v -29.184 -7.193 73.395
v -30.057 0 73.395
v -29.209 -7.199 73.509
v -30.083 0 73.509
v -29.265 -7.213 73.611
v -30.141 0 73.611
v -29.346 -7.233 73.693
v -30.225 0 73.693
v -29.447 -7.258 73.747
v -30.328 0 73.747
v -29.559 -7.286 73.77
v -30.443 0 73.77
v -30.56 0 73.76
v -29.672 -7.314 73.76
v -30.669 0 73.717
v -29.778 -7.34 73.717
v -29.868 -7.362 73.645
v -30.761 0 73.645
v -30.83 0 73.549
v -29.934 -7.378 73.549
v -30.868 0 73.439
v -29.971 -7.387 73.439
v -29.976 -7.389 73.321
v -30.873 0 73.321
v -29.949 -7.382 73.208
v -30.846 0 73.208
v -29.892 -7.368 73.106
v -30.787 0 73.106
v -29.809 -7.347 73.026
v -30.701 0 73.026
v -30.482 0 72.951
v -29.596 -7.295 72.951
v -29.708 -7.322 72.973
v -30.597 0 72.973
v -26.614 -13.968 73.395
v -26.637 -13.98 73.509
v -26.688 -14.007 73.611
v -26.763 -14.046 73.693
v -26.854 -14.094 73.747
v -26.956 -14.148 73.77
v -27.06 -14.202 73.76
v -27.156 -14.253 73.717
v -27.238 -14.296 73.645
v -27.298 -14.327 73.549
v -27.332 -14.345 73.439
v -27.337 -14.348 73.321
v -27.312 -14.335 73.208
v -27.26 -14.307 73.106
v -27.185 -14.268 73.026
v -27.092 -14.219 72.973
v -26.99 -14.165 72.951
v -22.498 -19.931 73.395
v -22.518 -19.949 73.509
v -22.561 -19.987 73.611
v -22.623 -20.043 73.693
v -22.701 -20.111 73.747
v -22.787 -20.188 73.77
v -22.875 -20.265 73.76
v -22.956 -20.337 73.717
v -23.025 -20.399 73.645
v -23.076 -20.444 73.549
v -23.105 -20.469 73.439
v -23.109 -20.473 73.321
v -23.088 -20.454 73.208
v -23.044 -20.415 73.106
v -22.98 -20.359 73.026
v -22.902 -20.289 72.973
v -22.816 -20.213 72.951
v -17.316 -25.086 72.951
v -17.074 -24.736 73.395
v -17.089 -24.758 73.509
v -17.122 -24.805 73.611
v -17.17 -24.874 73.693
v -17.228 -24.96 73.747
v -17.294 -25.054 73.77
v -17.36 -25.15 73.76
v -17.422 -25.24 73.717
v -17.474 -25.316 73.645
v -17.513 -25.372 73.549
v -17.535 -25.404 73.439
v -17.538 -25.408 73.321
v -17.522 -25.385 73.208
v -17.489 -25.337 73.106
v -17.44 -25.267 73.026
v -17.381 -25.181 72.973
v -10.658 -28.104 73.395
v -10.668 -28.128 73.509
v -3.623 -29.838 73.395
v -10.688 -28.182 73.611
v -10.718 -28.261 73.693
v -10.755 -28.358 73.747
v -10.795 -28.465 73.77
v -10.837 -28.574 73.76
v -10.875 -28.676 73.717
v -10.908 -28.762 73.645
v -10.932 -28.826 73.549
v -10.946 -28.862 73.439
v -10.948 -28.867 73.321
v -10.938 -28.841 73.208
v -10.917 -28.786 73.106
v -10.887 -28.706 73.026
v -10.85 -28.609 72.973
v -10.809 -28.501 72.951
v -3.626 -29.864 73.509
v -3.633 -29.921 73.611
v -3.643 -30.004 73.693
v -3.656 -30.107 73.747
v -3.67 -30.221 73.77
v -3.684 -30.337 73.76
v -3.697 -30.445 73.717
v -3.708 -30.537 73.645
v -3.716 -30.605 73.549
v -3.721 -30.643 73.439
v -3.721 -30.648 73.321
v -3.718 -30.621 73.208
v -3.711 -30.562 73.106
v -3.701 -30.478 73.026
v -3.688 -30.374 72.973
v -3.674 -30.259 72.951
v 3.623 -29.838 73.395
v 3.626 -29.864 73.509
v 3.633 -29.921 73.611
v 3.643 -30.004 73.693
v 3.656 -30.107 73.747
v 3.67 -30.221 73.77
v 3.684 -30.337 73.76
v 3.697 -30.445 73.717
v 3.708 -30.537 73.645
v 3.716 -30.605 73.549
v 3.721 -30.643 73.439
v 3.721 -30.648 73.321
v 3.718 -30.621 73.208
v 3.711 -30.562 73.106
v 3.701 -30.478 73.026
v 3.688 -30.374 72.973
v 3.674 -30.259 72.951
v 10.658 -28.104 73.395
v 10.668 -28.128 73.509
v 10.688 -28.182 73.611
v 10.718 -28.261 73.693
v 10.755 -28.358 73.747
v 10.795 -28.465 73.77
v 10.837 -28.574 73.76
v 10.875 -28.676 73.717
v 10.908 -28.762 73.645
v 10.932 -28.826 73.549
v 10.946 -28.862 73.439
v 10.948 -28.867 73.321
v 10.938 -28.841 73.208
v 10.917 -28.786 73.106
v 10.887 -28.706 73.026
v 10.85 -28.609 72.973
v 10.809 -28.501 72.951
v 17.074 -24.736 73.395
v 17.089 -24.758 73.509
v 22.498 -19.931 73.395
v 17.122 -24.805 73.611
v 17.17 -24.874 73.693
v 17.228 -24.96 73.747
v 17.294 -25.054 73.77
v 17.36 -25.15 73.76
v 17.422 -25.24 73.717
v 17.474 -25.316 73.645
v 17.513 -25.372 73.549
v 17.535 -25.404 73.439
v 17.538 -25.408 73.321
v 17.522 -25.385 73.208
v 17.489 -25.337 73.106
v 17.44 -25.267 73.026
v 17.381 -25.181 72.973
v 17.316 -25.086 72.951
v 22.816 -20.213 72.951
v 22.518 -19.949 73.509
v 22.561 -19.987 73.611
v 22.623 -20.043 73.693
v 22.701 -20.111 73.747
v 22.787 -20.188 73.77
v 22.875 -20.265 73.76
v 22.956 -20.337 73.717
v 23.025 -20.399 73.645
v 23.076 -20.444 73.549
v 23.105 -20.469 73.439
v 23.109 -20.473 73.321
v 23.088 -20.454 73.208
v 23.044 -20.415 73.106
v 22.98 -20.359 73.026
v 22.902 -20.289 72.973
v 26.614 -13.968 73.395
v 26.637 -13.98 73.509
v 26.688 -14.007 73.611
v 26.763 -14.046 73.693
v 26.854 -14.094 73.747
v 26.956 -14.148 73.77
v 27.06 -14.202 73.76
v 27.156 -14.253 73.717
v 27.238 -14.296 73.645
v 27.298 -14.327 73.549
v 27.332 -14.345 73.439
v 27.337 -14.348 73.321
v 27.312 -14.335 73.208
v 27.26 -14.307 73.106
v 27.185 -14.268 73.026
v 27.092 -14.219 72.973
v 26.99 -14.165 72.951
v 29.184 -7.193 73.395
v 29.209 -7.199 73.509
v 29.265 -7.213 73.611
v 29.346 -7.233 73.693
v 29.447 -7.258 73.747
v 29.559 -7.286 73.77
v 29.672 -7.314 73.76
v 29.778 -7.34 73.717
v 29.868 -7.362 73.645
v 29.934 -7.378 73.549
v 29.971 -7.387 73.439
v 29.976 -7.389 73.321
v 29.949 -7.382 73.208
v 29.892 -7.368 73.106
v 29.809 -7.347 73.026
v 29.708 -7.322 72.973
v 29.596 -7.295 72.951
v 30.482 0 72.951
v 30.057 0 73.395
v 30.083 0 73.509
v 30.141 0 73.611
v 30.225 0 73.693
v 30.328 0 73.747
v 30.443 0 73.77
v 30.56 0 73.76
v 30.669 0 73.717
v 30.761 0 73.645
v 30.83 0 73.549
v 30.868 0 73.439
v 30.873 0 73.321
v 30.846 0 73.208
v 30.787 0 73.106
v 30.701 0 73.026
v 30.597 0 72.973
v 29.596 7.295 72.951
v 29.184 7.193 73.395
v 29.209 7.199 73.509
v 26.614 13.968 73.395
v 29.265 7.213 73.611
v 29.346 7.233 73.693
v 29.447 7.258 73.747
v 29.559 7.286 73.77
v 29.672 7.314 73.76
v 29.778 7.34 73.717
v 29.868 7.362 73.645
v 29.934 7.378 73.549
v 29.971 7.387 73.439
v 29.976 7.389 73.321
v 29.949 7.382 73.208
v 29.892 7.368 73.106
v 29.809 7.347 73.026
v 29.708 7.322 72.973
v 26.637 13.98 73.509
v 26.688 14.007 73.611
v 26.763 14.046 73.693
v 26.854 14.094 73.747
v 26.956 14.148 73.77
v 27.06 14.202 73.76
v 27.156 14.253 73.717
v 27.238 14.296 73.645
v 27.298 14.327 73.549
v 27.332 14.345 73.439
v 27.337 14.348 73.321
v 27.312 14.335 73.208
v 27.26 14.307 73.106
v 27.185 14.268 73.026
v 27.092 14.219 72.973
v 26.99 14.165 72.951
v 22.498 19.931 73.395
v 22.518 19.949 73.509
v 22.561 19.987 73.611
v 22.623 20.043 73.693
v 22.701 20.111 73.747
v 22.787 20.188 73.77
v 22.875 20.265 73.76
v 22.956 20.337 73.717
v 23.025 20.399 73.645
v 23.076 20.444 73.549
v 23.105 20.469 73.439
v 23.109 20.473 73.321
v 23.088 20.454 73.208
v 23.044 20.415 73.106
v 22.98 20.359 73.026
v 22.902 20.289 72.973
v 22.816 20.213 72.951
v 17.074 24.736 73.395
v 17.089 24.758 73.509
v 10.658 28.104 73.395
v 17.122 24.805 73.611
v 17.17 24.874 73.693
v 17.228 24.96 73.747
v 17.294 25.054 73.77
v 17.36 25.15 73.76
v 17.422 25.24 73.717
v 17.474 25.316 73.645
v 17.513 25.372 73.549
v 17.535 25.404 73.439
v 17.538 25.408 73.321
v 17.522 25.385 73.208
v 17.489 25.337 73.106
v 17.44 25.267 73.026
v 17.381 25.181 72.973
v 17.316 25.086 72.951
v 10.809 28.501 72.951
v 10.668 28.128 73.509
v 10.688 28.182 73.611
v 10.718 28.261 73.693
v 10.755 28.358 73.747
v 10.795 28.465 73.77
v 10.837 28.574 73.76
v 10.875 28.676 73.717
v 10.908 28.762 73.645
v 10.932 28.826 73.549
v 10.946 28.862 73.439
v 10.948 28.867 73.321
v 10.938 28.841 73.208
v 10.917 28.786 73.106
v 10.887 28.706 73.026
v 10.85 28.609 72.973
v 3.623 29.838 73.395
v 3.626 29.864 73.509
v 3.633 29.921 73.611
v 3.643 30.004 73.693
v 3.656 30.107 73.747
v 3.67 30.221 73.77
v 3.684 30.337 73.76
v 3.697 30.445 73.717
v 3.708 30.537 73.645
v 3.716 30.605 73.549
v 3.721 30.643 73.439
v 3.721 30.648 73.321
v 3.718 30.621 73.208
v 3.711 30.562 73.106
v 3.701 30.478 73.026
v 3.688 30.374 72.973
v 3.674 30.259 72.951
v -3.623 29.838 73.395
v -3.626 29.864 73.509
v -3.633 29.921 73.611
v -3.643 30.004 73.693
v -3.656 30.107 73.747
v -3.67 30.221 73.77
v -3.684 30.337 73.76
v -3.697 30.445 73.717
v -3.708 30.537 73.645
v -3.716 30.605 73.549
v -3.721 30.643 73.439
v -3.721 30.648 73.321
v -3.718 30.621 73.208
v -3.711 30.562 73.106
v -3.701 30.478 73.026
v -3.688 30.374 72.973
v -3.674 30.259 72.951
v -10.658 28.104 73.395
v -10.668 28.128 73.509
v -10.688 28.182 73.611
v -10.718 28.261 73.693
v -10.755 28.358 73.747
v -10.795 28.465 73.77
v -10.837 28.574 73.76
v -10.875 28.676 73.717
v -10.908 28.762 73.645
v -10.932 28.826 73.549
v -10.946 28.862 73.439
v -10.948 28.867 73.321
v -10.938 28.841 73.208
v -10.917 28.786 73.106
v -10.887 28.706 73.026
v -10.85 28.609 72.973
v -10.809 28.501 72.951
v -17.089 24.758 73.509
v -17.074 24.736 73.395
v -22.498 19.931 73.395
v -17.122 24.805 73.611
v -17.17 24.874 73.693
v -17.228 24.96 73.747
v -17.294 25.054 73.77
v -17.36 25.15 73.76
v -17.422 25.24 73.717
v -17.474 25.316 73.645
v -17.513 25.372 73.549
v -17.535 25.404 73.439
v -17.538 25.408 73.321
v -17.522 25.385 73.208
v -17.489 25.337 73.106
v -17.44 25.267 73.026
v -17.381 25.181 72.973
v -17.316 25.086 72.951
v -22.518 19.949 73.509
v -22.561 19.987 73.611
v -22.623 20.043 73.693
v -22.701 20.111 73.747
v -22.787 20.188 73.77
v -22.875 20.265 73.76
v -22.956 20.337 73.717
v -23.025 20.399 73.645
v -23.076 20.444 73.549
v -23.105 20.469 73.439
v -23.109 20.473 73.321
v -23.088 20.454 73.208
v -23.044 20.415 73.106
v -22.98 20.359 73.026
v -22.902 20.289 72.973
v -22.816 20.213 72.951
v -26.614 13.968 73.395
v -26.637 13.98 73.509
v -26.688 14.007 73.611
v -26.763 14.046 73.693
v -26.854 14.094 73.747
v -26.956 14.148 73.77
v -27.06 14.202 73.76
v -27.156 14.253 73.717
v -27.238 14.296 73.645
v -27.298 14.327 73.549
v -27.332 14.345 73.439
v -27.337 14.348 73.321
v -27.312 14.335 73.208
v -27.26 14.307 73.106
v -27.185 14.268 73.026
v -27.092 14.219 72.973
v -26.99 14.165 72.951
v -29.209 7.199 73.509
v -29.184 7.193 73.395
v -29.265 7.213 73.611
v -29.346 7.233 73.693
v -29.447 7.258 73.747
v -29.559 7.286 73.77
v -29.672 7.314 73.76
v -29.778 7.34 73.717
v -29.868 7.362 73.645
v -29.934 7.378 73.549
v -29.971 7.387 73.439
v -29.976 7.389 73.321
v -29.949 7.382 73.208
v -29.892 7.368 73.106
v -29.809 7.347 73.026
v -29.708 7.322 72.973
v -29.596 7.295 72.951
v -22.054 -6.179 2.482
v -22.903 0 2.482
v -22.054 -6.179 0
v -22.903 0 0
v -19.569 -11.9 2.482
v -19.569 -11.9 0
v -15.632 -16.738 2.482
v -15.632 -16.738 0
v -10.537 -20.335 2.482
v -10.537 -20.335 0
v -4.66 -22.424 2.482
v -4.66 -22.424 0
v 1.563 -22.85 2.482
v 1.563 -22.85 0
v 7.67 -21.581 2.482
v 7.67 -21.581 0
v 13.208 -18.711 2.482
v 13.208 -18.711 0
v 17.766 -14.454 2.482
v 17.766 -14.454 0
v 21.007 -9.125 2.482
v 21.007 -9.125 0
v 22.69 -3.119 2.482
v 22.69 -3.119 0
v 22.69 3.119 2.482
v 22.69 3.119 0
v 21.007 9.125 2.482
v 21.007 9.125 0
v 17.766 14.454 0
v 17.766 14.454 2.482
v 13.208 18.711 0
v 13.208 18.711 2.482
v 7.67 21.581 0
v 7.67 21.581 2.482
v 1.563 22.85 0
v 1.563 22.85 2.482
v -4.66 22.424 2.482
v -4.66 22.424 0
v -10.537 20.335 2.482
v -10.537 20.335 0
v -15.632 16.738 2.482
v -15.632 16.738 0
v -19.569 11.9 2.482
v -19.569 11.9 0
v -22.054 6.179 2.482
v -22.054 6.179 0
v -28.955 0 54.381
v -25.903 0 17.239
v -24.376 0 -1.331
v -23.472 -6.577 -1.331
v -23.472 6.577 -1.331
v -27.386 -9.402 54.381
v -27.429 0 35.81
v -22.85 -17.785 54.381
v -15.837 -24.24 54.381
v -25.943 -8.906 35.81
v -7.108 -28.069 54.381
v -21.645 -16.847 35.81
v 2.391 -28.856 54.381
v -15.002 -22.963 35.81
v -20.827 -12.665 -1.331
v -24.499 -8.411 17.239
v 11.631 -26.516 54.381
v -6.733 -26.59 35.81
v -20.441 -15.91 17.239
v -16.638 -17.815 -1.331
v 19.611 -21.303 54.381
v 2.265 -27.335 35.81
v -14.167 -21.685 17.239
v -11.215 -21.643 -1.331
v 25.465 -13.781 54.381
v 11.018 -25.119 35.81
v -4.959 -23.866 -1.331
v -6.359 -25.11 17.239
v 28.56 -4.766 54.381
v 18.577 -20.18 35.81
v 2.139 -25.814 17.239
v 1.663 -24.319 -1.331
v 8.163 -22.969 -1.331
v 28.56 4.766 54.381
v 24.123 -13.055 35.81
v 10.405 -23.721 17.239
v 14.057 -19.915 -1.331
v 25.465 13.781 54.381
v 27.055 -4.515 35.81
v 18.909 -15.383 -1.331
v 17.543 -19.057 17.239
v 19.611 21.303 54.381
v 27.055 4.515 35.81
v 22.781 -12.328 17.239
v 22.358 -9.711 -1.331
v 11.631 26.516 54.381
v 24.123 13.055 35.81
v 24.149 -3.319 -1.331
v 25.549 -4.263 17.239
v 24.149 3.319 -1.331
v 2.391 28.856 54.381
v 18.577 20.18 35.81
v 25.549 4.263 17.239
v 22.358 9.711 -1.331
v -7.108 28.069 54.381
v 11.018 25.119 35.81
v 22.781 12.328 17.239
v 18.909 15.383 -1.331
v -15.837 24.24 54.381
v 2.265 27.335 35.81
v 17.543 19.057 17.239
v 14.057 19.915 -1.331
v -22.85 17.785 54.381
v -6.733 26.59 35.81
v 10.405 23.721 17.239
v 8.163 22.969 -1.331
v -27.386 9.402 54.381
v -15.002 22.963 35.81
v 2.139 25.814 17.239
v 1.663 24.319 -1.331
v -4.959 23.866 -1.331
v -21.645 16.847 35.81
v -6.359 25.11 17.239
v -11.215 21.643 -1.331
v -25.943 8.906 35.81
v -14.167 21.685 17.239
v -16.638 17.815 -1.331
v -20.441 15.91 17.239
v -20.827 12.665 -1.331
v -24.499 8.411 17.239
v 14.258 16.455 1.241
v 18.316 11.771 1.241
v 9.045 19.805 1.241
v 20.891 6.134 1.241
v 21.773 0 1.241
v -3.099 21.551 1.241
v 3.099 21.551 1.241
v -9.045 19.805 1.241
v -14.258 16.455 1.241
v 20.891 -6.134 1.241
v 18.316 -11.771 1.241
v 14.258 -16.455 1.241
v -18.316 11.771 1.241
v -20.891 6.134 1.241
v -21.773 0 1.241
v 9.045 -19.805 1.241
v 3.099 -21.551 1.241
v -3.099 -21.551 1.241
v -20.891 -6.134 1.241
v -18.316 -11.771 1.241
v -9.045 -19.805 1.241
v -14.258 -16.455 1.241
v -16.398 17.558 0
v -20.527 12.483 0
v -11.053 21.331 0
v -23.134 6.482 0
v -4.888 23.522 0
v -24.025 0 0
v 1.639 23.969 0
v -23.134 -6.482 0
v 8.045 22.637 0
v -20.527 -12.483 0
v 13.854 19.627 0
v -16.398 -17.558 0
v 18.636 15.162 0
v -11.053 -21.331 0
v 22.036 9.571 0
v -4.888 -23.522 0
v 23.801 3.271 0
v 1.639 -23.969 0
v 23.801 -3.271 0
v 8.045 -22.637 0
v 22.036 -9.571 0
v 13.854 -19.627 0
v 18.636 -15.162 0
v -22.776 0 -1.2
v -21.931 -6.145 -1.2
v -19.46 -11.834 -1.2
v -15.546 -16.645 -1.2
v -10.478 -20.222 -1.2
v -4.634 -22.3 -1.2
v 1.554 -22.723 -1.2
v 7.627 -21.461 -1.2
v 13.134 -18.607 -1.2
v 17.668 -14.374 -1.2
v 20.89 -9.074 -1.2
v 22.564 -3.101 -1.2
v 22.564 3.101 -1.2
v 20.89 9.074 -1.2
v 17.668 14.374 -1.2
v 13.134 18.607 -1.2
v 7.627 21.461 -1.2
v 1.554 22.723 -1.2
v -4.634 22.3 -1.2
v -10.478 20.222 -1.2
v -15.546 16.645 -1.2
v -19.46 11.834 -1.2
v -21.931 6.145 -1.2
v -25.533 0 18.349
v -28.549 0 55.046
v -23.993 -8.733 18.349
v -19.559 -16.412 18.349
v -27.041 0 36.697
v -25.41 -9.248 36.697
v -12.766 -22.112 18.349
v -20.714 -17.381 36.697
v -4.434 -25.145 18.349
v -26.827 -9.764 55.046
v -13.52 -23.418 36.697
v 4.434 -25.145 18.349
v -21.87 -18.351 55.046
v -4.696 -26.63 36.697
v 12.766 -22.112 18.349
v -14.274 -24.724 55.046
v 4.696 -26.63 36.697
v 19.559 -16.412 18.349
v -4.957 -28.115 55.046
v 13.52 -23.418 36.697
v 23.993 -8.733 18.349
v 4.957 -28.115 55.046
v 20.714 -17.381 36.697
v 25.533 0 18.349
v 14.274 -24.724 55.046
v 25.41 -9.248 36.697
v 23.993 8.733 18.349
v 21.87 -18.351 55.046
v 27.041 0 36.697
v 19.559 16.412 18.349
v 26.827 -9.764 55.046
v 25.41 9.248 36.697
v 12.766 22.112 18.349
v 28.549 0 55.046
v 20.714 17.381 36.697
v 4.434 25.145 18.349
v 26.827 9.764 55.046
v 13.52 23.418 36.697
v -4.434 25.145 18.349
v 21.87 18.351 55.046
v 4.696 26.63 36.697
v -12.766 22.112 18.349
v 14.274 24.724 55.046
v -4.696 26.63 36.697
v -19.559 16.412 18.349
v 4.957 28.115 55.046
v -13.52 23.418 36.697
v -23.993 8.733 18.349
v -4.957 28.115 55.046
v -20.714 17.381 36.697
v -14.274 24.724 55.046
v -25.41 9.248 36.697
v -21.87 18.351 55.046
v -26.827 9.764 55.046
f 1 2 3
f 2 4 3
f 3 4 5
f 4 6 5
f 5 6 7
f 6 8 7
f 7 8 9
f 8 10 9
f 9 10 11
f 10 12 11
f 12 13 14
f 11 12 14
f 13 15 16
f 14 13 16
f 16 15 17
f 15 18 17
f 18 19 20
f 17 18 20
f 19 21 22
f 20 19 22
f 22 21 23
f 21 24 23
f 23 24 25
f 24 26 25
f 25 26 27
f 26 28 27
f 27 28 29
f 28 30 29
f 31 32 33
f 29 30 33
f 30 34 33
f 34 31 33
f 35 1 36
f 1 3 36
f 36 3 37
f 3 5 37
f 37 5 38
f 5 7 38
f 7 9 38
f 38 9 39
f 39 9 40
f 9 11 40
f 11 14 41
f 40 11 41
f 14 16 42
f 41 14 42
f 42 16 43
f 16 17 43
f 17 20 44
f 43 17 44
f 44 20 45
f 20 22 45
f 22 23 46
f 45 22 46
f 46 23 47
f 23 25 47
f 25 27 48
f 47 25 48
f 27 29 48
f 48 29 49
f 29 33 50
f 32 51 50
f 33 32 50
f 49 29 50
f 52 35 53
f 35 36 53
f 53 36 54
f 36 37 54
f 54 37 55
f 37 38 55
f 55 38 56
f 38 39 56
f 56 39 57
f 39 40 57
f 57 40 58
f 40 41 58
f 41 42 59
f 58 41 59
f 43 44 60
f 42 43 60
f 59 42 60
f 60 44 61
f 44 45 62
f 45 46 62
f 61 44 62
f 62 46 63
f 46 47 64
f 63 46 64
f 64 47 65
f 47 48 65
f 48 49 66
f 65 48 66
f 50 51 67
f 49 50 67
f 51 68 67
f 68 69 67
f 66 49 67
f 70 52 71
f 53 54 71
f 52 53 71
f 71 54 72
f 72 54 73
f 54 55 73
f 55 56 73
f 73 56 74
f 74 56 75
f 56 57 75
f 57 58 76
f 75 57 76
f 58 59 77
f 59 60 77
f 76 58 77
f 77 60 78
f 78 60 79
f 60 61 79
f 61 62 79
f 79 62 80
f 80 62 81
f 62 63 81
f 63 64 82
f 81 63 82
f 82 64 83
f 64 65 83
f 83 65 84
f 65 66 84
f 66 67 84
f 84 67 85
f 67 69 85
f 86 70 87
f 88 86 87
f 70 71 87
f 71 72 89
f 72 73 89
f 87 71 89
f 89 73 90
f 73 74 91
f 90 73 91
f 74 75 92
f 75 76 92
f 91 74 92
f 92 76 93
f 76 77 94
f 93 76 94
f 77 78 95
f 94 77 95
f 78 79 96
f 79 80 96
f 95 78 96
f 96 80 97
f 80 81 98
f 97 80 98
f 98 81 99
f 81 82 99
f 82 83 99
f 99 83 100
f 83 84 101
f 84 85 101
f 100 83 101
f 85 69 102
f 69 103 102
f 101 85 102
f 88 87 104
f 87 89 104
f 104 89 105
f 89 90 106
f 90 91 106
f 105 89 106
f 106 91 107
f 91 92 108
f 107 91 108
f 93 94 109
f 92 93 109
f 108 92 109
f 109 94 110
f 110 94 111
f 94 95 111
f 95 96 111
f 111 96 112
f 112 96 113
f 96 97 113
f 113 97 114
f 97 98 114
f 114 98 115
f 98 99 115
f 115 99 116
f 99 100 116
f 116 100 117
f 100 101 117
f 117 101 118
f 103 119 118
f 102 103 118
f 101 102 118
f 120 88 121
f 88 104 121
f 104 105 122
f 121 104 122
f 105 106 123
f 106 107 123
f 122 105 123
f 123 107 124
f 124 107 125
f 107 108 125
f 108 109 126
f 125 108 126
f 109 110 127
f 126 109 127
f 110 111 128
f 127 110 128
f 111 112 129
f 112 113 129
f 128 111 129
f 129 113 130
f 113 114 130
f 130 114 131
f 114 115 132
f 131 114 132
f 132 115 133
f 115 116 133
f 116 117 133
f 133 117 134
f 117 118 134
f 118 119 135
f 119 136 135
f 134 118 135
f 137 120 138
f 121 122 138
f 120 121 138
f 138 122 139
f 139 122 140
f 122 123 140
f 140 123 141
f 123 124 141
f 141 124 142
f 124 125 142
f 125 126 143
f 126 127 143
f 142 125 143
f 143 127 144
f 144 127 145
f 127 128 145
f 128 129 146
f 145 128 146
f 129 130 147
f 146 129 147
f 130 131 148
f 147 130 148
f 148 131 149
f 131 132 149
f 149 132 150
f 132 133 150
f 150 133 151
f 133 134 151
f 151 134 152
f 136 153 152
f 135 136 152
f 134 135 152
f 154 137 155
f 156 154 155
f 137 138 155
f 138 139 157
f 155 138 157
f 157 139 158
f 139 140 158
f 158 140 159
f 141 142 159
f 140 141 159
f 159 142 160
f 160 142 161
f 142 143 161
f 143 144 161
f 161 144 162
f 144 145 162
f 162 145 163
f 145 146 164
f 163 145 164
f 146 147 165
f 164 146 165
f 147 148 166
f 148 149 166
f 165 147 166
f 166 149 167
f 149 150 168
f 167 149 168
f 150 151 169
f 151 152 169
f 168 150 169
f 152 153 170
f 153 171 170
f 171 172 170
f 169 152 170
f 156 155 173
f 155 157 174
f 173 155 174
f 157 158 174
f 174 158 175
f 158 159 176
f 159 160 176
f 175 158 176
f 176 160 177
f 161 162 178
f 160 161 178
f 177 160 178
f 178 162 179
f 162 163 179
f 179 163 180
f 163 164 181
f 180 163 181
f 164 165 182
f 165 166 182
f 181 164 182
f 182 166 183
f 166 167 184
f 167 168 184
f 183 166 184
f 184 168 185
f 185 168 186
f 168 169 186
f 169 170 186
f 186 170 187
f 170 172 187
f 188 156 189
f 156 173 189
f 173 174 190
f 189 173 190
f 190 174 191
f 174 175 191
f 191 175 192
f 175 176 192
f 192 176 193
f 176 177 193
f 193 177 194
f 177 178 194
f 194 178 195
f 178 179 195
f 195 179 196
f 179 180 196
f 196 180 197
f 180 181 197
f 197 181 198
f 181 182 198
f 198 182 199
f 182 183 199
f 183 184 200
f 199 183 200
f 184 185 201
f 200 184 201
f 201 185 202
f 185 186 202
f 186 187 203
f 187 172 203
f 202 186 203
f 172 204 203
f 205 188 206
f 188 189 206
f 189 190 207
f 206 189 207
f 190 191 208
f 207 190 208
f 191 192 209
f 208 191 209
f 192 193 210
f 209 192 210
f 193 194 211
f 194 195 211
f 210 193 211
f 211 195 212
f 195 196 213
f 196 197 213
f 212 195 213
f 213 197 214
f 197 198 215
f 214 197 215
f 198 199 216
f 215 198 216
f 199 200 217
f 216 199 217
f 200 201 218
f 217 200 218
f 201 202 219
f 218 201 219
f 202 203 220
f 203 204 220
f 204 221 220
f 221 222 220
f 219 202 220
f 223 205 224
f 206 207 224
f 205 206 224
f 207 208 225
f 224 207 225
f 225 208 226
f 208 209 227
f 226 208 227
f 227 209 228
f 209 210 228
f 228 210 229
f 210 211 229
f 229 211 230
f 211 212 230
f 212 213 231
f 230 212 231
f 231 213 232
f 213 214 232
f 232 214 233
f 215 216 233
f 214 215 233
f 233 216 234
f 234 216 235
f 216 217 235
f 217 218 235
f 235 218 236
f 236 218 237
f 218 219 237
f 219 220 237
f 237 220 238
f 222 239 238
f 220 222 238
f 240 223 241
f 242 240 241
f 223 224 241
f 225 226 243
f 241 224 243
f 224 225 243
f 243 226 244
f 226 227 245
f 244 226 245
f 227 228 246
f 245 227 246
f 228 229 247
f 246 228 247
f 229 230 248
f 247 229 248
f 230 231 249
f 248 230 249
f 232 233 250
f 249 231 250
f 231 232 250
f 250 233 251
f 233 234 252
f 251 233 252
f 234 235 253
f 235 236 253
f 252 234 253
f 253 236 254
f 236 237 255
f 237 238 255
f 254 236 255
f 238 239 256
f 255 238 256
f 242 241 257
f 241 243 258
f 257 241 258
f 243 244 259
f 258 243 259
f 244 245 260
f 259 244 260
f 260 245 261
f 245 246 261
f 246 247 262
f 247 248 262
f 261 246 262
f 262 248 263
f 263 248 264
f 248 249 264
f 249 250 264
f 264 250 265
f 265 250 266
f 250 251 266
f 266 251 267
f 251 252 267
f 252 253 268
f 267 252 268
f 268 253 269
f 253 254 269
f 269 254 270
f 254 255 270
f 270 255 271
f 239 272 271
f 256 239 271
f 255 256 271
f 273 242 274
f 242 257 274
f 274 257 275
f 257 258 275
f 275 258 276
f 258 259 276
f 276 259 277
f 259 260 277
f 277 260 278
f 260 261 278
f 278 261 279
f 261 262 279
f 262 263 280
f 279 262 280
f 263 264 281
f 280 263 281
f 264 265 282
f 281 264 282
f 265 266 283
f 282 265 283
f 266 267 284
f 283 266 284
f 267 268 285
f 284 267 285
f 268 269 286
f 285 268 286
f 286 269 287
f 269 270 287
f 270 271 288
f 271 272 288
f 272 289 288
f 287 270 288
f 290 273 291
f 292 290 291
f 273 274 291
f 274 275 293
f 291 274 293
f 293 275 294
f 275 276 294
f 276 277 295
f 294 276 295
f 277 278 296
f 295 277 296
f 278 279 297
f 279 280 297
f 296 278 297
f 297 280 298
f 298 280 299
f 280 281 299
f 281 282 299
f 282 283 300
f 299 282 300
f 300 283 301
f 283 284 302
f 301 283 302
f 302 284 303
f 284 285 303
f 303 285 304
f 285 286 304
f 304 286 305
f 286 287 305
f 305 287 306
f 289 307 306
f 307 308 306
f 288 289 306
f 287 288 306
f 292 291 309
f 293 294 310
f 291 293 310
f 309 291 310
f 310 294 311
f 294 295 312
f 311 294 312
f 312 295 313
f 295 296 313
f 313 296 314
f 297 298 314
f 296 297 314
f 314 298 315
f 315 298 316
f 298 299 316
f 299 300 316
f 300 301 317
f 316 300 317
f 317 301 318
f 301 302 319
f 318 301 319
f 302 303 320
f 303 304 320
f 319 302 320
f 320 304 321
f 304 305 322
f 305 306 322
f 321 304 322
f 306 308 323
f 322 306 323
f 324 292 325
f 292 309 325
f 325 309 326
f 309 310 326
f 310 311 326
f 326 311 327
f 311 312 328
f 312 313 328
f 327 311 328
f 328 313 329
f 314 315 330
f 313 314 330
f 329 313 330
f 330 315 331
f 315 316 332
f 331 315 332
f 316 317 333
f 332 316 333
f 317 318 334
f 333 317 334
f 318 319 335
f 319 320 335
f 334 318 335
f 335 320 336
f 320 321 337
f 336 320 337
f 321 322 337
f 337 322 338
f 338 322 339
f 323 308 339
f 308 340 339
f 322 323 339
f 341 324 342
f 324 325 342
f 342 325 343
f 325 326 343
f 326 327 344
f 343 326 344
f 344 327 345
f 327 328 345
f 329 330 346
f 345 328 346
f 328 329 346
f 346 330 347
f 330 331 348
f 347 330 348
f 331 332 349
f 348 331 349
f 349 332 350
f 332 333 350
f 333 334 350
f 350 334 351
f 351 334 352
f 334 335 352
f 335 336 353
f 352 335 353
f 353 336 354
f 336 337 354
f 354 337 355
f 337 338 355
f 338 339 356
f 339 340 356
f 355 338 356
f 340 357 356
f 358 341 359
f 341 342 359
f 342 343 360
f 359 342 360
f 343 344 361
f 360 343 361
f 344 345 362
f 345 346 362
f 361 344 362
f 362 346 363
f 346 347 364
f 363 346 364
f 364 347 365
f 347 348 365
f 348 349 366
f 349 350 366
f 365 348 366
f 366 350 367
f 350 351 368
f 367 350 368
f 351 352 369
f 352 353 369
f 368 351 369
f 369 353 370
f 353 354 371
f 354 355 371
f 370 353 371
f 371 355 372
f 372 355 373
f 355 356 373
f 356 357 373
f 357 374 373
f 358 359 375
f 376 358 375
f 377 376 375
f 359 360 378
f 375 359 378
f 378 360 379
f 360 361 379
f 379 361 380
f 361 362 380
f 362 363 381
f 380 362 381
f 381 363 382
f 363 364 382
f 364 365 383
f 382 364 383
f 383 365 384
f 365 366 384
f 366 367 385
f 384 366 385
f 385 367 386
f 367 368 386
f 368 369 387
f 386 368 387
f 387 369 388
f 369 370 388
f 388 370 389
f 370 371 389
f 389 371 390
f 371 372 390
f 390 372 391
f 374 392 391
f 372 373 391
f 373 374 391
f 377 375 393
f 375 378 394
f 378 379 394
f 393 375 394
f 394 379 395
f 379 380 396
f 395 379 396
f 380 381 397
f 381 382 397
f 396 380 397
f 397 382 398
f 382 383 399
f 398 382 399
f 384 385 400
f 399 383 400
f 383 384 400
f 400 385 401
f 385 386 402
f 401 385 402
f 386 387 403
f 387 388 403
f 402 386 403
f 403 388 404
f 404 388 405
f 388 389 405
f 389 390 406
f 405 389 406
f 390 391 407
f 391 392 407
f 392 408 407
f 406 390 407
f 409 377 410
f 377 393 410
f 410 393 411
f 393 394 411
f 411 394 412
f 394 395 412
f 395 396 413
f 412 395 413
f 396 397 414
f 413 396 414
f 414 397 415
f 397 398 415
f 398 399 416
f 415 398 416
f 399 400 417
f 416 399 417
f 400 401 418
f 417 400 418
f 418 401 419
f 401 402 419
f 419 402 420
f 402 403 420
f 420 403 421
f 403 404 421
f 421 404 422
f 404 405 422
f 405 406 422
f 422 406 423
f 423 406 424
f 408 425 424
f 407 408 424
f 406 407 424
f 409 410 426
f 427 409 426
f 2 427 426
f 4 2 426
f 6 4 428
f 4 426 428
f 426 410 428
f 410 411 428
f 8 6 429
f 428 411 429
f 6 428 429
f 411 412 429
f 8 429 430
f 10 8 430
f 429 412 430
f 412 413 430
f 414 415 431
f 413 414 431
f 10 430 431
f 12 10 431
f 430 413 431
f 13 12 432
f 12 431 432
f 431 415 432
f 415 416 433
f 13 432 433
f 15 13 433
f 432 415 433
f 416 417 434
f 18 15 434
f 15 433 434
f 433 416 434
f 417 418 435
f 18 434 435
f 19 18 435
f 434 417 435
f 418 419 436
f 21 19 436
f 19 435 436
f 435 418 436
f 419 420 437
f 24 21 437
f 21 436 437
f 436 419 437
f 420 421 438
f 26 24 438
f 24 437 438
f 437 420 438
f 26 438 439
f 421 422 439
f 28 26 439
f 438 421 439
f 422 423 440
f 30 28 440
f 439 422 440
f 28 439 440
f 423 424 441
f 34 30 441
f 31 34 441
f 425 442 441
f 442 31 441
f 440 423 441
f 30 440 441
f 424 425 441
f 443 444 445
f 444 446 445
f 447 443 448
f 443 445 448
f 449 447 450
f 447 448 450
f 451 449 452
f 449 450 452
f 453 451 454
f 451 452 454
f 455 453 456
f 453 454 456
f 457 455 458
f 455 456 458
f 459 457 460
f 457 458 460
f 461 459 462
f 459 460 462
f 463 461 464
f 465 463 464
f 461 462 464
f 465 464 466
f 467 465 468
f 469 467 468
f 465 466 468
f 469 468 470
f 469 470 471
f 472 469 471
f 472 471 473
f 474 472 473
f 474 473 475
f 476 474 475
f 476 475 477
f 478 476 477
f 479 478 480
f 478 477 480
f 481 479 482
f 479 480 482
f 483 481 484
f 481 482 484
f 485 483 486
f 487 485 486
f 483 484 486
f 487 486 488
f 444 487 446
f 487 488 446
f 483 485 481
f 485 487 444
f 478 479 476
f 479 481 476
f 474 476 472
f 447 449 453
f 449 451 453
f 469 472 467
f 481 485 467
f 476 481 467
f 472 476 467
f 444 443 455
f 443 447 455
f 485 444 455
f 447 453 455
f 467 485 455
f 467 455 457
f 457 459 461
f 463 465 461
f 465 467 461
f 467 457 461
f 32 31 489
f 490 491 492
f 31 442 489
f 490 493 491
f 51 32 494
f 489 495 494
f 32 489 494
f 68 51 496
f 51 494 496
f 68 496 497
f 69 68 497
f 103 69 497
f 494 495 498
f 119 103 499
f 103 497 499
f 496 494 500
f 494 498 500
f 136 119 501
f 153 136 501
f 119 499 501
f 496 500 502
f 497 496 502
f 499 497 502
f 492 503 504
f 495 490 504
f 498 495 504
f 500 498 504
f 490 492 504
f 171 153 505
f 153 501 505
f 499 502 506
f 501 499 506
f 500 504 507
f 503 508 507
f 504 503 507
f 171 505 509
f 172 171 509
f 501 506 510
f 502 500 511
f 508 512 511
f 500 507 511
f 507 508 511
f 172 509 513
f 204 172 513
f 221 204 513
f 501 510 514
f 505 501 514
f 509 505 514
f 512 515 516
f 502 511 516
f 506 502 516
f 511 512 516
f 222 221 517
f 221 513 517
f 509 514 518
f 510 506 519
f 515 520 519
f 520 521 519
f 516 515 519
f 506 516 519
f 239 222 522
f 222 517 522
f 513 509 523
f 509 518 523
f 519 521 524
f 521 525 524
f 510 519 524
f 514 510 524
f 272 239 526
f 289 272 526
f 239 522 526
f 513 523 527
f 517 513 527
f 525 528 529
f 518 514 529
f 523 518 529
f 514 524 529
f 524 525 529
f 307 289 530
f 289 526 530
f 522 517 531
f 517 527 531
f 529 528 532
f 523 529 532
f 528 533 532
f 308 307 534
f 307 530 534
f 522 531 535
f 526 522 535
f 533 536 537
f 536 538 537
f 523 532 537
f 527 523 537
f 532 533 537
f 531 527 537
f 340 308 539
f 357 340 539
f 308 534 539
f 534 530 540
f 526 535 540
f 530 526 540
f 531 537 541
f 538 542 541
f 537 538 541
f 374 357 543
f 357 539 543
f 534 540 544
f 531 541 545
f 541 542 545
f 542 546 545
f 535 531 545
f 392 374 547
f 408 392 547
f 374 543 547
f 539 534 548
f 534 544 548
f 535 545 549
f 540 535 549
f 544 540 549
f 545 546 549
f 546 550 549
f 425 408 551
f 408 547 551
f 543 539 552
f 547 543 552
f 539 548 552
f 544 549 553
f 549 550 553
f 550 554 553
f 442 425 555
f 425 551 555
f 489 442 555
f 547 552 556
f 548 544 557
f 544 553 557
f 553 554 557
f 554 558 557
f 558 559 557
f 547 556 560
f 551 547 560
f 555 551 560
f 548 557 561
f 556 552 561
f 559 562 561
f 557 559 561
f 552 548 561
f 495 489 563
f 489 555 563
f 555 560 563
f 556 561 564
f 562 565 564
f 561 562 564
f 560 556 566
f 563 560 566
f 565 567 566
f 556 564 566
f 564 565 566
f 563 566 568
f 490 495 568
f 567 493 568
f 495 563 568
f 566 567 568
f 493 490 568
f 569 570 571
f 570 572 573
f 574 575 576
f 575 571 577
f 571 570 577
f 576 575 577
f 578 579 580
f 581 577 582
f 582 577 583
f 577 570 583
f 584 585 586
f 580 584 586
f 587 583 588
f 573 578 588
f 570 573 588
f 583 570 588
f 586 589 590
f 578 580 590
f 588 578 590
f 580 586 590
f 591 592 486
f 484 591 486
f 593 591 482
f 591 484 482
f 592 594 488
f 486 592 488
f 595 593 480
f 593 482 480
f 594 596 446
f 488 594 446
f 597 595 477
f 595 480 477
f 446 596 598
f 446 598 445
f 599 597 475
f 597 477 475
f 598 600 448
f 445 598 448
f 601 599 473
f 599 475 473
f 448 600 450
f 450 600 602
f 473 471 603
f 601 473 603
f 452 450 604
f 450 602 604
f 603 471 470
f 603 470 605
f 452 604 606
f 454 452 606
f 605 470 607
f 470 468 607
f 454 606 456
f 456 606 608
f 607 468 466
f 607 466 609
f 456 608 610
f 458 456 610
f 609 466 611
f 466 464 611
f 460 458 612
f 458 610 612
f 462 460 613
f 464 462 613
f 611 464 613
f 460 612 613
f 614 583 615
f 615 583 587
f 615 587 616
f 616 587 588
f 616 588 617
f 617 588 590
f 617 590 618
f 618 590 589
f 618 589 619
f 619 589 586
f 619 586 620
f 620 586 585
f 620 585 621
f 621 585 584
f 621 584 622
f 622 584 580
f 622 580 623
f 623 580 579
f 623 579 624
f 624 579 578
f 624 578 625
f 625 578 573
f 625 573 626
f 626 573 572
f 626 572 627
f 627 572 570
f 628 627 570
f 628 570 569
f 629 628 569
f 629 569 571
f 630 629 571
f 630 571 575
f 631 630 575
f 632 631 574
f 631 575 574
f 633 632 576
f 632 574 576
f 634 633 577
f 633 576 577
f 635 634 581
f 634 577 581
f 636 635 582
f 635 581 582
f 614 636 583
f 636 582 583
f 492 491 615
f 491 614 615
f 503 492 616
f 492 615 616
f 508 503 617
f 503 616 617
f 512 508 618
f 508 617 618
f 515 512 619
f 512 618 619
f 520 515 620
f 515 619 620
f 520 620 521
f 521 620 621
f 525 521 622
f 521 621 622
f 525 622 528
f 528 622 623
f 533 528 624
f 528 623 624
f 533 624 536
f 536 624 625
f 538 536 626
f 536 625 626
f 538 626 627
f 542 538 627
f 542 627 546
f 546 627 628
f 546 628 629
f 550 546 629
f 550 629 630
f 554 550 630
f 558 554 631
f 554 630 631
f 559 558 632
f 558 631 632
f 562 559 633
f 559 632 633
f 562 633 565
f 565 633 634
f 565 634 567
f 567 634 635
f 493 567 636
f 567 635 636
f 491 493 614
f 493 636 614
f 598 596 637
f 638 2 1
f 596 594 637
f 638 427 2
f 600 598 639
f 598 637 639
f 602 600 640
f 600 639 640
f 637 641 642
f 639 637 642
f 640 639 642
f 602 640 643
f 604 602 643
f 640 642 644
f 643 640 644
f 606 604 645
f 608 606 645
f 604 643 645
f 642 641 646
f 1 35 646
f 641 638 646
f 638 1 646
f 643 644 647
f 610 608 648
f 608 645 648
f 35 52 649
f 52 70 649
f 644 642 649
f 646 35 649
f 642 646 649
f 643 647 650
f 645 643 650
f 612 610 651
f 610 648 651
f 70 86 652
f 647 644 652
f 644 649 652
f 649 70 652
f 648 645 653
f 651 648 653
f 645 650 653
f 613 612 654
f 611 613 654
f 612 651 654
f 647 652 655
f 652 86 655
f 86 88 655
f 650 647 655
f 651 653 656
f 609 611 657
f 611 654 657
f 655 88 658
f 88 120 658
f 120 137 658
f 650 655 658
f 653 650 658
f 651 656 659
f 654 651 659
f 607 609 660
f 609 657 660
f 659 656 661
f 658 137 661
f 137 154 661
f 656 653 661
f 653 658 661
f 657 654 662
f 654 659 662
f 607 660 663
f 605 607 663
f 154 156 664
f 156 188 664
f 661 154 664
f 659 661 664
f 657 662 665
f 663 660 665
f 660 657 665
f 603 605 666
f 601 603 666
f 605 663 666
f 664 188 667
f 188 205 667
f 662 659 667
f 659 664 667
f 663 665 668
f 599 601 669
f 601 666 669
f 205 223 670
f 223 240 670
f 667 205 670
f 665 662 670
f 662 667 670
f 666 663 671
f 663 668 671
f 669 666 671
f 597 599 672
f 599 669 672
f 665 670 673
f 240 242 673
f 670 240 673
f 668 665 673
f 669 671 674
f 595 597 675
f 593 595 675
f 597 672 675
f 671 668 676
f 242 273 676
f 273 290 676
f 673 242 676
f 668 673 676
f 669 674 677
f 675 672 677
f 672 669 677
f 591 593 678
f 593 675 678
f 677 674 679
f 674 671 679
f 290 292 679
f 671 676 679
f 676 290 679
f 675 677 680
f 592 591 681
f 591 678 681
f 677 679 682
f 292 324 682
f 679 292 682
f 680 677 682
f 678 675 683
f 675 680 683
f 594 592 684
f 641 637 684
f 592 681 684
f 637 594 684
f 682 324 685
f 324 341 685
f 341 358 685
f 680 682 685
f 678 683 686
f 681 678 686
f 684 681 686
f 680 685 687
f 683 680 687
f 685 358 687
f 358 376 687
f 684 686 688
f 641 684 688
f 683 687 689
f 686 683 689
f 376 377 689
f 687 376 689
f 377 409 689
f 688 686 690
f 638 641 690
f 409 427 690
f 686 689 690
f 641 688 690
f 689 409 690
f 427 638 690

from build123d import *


with BuildPart() as f1:
    # F0 (on Front) → F1 (revolve)
    with BuildSketch(Plane.XZ):
        with BuildLine():
            Line((0, 1.241046), (0, 2.482092))
            Line((0, 2.482092), (-22.902938, 2.482092))
            Line((-22.902938, 2.482092), (-22.902938, 0))
            Line((-22.902938, 0), (-24.024541, 0))
            Line((-24.024541, 0), (-30.056966, 73.394649))
            ThreePointArc((-30.056966, 73.394649), (-30.761444, 73.644653), (-30.481581, 72.951496))
            Line((-30.481581, 72.951496), (-24.376155, -1.331323))
            Line((-24.376155, -1.331323), (-22.775946, -1.199799))
            Line((-22.775946, -1.199799), (-21.772536, 1.241046))
            Line((-21.772536, 1.241046), (0, 1.241046))
        make_face()
    revolve(axis=Axis((0, 0, 1.861569), (0, 0, 1)))


solid = f1.part
